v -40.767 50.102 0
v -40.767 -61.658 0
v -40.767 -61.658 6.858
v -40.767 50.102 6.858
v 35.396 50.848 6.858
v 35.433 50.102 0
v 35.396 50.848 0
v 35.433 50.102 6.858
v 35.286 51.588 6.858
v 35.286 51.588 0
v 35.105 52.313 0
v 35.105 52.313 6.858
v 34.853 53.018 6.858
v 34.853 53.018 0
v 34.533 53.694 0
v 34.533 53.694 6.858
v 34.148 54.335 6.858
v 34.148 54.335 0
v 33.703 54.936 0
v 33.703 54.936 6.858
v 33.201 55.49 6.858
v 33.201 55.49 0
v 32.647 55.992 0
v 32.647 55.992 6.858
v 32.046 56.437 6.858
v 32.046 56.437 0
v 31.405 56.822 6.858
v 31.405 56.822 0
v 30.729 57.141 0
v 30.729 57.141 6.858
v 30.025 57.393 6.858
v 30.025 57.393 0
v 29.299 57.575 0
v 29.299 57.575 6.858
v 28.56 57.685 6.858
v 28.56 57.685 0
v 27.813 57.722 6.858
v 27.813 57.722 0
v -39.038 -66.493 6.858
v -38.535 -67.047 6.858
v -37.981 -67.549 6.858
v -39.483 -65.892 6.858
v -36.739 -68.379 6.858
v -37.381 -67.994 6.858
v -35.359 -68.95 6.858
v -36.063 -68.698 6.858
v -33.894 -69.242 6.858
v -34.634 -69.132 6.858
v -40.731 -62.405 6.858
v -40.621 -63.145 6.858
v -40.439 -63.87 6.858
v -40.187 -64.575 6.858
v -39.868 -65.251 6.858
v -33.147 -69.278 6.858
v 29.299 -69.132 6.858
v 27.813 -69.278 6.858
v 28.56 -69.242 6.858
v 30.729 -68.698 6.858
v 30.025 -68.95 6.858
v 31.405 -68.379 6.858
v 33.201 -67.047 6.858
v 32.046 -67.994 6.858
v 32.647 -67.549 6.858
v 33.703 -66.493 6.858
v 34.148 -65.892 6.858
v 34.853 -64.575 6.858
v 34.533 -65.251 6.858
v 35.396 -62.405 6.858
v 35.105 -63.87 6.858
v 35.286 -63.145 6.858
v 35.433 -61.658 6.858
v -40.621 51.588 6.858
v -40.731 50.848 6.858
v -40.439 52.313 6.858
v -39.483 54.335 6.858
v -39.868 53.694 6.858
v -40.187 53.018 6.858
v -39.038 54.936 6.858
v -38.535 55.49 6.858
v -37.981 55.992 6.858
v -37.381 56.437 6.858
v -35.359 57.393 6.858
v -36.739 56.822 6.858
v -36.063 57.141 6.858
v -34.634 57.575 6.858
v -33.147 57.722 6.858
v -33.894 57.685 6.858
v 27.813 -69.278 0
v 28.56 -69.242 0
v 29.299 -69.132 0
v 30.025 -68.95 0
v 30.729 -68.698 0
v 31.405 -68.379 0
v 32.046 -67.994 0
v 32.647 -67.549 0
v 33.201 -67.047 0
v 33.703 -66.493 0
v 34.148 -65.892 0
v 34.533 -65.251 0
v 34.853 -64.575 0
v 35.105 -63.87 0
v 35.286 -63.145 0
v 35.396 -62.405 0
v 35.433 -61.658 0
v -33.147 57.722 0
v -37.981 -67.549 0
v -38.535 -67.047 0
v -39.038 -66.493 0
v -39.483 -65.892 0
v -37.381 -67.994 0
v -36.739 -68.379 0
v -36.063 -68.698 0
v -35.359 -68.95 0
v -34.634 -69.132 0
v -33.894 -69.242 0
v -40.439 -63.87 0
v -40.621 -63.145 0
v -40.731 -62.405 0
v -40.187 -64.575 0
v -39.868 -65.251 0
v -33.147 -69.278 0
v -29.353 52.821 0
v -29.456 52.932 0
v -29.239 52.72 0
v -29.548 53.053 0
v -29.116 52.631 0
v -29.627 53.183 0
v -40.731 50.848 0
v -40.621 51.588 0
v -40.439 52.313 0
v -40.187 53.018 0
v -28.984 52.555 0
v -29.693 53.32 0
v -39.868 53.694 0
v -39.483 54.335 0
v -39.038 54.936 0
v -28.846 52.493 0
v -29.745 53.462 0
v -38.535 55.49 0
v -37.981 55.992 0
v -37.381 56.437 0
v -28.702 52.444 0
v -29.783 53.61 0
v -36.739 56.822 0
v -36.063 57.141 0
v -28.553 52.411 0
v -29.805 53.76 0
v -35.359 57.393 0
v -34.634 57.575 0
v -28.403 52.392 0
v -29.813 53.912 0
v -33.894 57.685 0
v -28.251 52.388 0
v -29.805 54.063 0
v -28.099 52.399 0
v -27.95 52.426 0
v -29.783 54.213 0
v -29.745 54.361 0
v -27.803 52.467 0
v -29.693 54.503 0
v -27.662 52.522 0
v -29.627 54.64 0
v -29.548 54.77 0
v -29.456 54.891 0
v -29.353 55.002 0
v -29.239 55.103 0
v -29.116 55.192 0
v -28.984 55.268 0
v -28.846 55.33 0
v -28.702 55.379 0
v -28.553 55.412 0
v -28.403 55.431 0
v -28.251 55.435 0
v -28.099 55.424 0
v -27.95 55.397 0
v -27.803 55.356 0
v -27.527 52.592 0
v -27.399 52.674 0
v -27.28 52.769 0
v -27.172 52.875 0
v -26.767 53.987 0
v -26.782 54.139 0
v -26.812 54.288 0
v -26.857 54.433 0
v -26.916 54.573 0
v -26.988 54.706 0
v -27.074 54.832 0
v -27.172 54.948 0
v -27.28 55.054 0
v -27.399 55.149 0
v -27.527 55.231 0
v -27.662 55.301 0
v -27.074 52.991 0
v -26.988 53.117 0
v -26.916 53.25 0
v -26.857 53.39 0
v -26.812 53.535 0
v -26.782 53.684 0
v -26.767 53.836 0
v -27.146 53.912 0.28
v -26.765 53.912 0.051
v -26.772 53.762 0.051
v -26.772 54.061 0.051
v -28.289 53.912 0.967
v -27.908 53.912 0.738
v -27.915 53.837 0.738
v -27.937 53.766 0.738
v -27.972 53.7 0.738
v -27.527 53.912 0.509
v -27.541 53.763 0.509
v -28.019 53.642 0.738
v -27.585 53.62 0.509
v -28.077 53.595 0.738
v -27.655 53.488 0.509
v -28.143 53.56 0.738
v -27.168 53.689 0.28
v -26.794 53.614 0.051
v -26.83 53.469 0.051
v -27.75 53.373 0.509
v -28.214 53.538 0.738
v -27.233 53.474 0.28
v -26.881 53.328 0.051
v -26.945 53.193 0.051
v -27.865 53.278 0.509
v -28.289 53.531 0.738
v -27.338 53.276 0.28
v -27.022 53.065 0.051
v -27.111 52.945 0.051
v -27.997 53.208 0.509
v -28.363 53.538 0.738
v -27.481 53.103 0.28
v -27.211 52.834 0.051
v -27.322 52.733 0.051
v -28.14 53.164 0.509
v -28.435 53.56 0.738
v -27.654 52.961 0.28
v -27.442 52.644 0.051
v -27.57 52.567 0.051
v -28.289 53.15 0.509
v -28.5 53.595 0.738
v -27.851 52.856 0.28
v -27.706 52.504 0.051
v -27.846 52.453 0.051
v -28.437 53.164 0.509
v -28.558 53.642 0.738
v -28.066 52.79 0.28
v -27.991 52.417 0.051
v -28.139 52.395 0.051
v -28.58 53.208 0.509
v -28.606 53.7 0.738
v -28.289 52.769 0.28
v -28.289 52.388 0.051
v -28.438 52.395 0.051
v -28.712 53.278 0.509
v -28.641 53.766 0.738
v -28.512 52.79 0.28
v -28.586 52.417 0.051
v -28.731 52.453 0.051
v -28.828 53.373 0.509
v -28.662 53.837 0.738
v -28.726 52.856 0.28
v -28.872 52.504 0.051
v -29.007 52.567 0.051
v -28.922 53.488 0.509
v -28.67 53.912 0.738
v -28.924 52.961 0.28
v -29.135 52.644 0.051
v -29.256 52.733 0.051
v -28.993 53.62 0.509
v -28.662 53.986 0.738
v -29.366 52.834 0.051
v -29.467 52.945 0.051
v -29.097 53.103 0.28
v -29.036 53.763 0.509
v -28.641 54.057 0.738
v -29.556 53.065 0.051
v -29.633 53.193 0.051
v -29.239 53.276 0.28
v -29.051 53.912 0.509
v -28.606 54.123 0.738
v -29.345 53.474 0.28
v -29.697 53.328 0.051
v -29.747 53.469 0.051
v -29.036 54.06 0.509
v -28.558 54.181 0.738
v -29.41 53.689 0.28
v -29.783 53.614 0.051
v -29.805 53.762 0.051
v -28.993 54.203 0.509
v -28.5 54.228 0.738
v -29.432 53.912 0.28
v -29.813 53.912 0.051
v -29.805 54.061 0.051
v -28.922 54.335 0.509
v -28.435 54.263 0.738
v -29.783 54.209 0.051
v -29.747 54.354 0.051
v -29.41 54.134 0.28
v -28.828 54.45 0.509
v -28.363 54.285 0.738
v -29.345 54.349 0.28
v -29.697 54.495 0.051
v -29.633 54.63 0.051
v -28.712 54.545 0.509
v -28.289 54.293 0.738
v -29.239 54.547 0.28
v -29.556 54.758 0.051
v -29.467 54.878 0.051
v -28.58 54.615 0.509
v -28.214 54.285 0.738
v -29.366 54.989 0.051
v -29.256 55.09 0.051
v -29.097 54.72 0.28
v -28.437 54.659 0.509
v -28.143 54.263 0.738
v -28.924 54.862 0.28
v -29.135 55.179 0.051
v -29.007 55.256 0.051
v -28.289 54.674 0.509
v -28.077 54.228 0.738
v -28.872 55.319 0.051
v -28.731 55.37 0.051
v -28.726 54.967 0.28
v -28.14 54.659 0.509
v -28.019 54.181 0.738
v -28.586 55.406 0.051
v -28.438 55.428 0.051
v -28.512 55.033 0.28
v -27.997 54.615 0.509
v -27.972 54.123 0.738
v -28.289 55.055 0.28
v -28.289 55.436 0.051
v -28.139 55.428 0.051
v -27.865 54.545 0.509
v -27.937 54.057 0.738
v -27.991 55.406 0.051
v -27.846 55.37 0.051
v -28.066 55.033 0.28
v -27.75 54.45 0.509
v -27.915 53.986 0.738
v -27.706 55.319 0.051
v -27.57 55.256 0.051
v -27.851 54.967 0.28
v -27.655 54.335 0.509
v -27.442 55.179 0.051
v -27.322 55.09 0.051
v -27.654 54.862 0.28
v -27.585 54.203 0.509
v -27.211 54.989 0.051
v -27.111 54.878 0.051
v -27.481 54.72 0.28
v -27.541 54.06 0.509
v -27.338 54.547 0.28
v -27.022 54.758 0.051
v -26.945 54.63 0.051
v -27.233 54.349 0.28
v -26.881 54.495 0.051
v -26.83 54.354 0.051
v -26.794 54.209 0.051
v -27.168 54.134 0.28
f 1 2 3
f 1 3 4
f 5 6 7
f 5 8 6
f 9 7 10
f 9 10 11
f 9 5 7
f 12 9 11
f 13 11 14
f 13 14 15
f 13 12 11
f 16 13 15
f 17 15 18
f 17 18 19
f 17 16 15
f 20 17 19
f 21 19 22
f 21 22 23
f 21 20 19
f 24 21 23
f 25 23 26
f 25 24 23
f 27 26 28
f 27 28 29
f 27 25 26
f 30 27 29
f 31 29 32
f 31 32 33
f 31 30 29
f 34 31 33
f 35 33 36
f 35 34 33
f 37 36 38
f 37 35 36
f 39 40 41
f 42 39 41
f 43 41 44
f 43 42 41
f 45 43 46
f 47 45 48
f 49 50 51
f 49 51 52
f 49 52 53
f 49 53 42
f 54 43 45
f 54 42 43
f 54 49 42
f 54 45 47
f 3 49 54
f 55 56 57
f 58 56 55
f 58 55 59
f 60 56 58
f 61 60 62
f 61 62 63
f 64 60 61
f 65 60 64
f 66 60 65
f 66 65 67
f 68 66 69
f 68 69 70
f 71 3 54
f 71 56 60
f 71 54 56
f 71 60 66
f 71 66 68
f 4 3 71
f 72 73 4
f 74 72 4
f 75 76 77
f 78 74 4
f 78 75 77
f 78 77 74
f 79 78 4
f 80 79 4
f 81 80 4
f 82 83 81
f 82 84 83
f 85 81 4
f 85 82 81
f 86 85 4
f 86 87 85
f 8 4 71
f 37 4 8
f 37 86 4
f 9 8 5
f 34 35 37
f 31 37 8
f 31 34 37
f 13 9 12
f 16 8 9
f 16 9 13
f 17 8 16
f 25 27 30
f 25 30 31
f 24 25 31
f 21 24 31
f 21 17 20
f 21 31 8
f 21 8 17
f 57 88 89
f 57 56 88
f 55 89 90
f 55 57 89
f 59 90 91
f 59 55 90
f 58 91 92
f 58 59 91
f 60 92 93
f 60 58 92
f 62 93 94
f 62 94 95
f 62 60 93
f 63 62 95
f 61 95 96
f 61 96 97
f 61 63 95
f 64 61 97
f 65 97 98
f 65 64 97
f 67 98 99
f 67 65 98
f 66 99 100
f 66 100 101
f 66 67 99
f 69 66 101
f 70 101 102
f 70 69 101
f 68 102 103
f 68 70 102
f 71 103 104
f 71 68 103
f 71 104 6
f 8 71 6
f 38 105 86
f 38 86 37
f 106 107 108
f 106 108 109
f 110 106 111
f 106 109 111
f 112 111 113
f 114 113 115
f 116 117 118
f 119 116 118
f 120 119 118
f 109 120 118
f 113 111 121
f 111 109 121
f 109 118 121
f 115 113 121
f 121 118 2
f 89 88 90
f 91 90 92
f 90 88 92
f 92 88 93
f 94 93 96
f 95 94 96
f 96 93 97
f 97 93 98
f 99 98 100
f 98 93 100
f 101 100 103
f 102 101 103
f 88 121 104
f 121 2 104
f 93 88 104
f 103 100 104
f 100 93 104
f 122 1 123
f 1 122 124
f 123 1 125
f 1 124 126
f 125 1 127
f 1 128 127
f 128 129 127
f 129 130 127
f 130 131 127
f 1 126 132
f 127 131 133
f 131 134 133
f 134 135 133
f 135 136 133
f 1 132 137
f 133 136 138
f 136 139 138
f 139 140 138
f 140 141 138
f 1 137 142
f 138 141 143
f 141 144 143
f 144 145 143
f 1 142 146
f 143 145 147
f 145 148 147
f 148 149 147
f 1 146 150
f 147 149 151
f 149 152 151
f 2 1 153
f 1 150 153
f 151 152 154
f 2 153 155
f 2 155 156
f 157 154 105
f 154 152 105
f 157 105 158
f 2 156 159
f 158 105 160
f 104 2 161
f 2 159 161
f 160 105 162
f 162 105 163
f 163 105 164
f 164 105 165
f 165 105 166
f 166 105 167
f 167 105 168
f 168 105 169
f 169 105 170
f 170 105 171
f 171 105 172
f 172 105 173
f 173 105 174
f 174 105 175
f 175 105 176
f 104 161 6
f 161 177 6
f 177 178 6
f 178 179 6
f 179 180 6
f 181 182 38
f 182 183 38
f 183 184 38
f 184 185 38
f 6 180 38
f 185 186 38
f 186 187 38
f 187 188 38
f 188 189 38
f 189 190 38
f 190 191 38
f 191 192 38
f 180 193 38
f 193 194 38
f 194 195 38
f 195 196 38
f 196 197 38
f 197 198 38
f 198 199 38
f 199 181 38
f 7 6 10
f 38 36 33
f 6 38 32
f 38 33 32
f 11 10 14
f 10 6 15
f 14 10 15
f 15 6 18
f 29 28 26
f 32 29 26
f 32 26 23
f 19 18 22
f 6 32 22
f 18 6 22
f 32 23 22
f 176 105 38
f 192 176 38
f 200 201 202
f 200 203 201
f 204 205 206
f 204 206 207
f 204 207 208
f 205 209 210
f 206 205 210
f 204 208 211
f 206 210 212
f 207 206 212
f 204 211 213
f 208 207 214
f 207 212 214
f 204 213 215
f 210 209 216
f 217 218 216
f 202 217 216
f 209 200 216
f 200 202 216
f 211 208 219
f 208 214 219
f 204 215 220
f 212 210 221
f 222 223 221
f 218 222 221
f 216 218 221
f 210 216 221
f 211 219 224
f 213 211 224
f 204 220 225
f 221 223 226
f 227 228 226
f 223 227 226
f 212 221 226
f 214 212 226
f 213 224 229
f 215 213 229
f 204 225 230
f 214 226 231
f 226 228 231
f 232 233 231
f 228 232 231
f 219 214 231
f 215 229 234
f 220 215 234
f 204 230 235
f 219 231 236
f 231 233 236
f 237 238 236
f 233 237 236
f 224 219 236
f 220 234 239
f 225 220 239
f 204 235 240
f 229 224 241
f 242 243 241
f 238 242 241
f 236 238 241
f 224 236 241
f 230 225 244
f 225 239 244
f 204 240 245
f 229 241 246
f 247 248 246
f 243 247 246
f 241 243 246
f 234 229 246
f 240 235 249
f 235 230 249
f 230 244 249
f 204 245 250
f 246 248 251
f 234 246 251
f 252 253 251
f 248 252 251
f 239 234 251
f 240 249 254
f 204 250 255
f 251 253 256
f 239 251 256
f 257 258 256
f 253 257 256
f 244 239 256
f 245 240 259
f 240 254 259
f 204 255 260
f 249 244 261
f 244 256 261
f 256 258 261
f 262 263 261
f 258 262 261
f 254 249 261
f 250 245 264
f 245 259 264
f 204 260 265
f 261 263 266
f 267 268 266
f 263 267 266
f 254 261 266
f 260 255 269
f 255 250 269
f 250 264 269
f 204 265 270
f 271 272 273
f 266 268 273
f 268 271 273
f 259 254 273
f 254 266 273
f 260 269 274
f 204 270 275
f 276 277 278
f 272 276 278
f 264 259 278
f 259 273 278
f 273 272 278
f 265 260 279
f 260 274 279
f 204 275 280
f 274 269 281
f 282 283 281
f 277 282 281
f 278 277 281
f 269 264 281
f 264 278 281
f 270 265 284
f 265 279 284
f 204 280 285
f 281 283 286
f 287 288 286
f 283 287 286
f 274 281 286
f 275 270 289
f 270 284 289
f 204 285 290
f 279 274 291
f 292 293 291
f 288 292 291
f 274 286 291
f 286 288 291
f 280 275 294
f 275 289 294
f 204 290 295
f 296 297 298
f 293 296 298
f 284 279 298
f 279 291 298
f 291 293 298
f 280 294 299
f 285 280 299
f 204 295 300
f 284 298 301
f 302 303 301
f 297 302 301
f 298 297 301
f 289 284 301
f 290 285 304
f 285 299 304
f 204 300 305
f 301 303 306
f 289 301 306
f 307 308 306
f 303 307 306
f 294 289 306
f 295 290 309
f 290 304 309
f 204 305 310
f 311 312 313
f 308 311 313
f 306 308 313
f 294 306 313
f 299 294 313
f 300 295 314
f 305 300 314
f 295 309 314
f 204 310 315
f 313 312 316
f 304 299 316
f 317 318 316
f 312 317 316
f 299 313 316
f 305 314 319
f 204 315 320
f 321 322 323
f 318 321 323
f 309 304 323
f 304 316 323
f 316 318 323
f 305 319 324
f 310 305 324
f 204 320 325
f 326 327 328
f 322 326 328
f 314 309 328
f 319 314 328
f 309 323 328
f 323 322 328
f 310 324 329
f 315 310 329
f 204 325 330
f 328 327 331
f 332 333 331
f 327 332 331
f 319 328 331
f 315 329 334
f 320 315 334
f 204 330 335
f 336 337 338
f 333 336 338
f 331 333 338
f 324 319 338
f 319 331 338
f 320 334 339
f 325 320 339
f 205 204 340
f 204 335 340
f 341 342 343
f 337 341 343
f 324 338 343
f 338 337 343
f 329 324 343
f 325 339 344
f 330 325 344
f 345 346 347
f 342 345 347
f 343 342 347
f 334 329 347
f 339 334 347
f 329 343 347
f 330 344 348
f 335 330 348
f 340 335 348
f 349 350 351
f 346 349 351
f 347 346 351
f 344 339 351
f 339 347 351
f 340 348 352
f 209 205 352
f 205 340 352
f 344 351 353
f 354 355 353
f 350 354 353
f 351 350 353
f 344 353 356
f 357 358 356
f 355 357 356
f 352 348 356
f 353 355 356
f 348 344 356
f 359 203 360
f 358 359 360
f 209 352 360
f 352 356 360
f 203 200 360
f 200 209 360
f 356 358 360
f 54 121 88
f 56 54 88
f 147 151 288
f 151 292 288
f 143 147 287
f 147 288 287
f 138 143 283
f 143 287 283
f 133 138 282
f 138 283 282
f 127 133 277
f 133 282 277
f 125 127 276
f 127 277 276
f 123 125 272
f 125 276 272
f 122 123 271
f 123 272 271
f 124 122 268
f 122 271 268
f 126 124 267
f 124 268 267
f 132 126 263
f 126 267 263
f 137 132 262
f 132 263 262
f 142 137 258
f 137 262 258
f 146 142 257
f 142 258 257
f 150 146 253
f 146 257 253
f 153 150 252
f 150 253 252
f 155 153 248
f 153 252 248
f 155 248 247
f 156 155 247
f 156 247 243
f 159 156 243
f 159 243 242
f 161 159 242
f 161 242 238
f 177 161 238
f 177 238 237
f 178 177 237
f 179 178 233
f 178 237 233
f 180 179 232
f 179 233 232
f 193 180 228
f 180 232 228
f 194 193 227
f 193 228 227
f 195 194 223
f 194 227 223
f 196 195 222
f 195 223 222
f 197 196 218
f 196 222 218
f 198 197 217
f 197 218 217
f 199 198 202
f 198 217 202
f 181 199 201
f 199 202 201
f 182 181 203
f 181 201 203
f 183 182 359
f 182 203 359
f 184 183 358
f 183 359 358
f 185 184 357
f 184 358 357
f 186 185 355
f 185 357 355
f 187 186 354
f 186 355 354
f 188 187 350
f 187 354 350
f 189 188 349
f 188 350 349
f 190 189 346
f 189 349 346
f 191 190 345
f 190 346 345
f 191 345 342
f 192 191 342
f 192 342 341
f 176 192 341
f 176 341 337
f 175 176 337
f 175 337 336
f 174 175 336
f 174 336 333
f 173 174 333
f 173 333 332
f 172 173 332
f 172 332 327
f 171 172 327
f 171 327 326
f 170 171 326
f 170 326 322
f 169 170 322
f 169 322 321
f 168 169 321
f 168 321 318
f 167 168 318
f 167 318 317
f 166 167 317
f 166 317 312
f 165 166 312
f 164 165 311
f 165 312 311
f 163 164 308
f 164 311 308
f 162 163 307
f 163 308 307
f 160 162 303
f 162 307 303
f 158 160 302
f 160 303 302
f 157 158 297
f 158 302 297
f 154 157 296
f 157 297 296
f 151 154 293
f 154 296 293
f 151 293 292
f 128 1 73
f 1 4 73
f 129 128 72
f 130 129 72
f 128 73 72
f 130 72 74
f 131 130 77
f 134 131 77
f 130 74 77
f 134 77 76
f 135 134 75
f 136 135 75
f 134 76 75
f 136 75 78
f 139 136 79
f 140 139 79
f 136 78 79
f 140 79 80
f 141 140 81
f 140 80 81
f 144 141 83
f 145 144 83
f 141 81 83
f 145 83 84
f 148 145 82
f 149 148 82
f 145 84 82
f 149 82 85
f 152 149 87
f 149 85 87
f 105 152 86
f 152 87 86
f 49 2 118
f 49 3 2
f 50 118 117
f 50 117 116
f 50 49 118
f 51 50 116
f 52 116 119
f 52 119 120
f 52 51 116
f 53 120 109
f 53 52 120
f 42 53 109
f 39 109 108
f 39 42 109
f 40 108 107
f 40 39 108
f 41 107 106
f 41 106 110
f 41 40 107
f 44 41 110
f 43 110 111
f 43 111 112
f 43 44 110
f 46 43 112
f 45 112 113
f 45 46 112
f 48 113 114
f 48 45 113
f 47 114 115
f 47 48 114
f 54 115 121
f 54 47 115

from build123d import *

# Parameters (mm, degrees)
F0_W     = 76.2
F0_H     = 127
F1_DEPTH = 6.858
F2_R     = 7.62
F5_D     = 3.048
F5_DEPTH = 0.0508
F5_TIP   = 0.9157115834


with BuildPart() as f1:
    # F0 (on Top) → F1 (new body)
    with BuildSketch(Plane.XY):
        with Locations((-2.6673331412, -5.7784983073)):
            Rectangle(F0_W, F0_H)
    extrude(amount=F1_DEPTH)

    # F2
    f2_edges = [f1.edges().sort_by_distance(p)[0] for p in [
        (35.432667, 57.721502, 3.429),
        (-40.767333, 57.721502, 3.429),
        (-40.767333, -69.278498, 3.429),
        (35.432667, -69.278498, 3.429),
    ]]
    fillet(f2_edges, radius=F2_R)

    # F5
    with Locations(Plane(origin=(0, 0, 0), x_dir=(1, 0, 0), z_dir=(0, 0, -1))):
        with Locations((-28.2887630165, -53.9115016927)):
            Hole(F5_D / 2, depth=F5_DEPTH)
            with Locations((0, 0, -(F5_DEPTH + F5_TIP / 2))):  # 118° drill point
                Cone(0, F5_D / 2, F5_TIP, mode=Mode.SUBTRACT)


solid = f1.part
